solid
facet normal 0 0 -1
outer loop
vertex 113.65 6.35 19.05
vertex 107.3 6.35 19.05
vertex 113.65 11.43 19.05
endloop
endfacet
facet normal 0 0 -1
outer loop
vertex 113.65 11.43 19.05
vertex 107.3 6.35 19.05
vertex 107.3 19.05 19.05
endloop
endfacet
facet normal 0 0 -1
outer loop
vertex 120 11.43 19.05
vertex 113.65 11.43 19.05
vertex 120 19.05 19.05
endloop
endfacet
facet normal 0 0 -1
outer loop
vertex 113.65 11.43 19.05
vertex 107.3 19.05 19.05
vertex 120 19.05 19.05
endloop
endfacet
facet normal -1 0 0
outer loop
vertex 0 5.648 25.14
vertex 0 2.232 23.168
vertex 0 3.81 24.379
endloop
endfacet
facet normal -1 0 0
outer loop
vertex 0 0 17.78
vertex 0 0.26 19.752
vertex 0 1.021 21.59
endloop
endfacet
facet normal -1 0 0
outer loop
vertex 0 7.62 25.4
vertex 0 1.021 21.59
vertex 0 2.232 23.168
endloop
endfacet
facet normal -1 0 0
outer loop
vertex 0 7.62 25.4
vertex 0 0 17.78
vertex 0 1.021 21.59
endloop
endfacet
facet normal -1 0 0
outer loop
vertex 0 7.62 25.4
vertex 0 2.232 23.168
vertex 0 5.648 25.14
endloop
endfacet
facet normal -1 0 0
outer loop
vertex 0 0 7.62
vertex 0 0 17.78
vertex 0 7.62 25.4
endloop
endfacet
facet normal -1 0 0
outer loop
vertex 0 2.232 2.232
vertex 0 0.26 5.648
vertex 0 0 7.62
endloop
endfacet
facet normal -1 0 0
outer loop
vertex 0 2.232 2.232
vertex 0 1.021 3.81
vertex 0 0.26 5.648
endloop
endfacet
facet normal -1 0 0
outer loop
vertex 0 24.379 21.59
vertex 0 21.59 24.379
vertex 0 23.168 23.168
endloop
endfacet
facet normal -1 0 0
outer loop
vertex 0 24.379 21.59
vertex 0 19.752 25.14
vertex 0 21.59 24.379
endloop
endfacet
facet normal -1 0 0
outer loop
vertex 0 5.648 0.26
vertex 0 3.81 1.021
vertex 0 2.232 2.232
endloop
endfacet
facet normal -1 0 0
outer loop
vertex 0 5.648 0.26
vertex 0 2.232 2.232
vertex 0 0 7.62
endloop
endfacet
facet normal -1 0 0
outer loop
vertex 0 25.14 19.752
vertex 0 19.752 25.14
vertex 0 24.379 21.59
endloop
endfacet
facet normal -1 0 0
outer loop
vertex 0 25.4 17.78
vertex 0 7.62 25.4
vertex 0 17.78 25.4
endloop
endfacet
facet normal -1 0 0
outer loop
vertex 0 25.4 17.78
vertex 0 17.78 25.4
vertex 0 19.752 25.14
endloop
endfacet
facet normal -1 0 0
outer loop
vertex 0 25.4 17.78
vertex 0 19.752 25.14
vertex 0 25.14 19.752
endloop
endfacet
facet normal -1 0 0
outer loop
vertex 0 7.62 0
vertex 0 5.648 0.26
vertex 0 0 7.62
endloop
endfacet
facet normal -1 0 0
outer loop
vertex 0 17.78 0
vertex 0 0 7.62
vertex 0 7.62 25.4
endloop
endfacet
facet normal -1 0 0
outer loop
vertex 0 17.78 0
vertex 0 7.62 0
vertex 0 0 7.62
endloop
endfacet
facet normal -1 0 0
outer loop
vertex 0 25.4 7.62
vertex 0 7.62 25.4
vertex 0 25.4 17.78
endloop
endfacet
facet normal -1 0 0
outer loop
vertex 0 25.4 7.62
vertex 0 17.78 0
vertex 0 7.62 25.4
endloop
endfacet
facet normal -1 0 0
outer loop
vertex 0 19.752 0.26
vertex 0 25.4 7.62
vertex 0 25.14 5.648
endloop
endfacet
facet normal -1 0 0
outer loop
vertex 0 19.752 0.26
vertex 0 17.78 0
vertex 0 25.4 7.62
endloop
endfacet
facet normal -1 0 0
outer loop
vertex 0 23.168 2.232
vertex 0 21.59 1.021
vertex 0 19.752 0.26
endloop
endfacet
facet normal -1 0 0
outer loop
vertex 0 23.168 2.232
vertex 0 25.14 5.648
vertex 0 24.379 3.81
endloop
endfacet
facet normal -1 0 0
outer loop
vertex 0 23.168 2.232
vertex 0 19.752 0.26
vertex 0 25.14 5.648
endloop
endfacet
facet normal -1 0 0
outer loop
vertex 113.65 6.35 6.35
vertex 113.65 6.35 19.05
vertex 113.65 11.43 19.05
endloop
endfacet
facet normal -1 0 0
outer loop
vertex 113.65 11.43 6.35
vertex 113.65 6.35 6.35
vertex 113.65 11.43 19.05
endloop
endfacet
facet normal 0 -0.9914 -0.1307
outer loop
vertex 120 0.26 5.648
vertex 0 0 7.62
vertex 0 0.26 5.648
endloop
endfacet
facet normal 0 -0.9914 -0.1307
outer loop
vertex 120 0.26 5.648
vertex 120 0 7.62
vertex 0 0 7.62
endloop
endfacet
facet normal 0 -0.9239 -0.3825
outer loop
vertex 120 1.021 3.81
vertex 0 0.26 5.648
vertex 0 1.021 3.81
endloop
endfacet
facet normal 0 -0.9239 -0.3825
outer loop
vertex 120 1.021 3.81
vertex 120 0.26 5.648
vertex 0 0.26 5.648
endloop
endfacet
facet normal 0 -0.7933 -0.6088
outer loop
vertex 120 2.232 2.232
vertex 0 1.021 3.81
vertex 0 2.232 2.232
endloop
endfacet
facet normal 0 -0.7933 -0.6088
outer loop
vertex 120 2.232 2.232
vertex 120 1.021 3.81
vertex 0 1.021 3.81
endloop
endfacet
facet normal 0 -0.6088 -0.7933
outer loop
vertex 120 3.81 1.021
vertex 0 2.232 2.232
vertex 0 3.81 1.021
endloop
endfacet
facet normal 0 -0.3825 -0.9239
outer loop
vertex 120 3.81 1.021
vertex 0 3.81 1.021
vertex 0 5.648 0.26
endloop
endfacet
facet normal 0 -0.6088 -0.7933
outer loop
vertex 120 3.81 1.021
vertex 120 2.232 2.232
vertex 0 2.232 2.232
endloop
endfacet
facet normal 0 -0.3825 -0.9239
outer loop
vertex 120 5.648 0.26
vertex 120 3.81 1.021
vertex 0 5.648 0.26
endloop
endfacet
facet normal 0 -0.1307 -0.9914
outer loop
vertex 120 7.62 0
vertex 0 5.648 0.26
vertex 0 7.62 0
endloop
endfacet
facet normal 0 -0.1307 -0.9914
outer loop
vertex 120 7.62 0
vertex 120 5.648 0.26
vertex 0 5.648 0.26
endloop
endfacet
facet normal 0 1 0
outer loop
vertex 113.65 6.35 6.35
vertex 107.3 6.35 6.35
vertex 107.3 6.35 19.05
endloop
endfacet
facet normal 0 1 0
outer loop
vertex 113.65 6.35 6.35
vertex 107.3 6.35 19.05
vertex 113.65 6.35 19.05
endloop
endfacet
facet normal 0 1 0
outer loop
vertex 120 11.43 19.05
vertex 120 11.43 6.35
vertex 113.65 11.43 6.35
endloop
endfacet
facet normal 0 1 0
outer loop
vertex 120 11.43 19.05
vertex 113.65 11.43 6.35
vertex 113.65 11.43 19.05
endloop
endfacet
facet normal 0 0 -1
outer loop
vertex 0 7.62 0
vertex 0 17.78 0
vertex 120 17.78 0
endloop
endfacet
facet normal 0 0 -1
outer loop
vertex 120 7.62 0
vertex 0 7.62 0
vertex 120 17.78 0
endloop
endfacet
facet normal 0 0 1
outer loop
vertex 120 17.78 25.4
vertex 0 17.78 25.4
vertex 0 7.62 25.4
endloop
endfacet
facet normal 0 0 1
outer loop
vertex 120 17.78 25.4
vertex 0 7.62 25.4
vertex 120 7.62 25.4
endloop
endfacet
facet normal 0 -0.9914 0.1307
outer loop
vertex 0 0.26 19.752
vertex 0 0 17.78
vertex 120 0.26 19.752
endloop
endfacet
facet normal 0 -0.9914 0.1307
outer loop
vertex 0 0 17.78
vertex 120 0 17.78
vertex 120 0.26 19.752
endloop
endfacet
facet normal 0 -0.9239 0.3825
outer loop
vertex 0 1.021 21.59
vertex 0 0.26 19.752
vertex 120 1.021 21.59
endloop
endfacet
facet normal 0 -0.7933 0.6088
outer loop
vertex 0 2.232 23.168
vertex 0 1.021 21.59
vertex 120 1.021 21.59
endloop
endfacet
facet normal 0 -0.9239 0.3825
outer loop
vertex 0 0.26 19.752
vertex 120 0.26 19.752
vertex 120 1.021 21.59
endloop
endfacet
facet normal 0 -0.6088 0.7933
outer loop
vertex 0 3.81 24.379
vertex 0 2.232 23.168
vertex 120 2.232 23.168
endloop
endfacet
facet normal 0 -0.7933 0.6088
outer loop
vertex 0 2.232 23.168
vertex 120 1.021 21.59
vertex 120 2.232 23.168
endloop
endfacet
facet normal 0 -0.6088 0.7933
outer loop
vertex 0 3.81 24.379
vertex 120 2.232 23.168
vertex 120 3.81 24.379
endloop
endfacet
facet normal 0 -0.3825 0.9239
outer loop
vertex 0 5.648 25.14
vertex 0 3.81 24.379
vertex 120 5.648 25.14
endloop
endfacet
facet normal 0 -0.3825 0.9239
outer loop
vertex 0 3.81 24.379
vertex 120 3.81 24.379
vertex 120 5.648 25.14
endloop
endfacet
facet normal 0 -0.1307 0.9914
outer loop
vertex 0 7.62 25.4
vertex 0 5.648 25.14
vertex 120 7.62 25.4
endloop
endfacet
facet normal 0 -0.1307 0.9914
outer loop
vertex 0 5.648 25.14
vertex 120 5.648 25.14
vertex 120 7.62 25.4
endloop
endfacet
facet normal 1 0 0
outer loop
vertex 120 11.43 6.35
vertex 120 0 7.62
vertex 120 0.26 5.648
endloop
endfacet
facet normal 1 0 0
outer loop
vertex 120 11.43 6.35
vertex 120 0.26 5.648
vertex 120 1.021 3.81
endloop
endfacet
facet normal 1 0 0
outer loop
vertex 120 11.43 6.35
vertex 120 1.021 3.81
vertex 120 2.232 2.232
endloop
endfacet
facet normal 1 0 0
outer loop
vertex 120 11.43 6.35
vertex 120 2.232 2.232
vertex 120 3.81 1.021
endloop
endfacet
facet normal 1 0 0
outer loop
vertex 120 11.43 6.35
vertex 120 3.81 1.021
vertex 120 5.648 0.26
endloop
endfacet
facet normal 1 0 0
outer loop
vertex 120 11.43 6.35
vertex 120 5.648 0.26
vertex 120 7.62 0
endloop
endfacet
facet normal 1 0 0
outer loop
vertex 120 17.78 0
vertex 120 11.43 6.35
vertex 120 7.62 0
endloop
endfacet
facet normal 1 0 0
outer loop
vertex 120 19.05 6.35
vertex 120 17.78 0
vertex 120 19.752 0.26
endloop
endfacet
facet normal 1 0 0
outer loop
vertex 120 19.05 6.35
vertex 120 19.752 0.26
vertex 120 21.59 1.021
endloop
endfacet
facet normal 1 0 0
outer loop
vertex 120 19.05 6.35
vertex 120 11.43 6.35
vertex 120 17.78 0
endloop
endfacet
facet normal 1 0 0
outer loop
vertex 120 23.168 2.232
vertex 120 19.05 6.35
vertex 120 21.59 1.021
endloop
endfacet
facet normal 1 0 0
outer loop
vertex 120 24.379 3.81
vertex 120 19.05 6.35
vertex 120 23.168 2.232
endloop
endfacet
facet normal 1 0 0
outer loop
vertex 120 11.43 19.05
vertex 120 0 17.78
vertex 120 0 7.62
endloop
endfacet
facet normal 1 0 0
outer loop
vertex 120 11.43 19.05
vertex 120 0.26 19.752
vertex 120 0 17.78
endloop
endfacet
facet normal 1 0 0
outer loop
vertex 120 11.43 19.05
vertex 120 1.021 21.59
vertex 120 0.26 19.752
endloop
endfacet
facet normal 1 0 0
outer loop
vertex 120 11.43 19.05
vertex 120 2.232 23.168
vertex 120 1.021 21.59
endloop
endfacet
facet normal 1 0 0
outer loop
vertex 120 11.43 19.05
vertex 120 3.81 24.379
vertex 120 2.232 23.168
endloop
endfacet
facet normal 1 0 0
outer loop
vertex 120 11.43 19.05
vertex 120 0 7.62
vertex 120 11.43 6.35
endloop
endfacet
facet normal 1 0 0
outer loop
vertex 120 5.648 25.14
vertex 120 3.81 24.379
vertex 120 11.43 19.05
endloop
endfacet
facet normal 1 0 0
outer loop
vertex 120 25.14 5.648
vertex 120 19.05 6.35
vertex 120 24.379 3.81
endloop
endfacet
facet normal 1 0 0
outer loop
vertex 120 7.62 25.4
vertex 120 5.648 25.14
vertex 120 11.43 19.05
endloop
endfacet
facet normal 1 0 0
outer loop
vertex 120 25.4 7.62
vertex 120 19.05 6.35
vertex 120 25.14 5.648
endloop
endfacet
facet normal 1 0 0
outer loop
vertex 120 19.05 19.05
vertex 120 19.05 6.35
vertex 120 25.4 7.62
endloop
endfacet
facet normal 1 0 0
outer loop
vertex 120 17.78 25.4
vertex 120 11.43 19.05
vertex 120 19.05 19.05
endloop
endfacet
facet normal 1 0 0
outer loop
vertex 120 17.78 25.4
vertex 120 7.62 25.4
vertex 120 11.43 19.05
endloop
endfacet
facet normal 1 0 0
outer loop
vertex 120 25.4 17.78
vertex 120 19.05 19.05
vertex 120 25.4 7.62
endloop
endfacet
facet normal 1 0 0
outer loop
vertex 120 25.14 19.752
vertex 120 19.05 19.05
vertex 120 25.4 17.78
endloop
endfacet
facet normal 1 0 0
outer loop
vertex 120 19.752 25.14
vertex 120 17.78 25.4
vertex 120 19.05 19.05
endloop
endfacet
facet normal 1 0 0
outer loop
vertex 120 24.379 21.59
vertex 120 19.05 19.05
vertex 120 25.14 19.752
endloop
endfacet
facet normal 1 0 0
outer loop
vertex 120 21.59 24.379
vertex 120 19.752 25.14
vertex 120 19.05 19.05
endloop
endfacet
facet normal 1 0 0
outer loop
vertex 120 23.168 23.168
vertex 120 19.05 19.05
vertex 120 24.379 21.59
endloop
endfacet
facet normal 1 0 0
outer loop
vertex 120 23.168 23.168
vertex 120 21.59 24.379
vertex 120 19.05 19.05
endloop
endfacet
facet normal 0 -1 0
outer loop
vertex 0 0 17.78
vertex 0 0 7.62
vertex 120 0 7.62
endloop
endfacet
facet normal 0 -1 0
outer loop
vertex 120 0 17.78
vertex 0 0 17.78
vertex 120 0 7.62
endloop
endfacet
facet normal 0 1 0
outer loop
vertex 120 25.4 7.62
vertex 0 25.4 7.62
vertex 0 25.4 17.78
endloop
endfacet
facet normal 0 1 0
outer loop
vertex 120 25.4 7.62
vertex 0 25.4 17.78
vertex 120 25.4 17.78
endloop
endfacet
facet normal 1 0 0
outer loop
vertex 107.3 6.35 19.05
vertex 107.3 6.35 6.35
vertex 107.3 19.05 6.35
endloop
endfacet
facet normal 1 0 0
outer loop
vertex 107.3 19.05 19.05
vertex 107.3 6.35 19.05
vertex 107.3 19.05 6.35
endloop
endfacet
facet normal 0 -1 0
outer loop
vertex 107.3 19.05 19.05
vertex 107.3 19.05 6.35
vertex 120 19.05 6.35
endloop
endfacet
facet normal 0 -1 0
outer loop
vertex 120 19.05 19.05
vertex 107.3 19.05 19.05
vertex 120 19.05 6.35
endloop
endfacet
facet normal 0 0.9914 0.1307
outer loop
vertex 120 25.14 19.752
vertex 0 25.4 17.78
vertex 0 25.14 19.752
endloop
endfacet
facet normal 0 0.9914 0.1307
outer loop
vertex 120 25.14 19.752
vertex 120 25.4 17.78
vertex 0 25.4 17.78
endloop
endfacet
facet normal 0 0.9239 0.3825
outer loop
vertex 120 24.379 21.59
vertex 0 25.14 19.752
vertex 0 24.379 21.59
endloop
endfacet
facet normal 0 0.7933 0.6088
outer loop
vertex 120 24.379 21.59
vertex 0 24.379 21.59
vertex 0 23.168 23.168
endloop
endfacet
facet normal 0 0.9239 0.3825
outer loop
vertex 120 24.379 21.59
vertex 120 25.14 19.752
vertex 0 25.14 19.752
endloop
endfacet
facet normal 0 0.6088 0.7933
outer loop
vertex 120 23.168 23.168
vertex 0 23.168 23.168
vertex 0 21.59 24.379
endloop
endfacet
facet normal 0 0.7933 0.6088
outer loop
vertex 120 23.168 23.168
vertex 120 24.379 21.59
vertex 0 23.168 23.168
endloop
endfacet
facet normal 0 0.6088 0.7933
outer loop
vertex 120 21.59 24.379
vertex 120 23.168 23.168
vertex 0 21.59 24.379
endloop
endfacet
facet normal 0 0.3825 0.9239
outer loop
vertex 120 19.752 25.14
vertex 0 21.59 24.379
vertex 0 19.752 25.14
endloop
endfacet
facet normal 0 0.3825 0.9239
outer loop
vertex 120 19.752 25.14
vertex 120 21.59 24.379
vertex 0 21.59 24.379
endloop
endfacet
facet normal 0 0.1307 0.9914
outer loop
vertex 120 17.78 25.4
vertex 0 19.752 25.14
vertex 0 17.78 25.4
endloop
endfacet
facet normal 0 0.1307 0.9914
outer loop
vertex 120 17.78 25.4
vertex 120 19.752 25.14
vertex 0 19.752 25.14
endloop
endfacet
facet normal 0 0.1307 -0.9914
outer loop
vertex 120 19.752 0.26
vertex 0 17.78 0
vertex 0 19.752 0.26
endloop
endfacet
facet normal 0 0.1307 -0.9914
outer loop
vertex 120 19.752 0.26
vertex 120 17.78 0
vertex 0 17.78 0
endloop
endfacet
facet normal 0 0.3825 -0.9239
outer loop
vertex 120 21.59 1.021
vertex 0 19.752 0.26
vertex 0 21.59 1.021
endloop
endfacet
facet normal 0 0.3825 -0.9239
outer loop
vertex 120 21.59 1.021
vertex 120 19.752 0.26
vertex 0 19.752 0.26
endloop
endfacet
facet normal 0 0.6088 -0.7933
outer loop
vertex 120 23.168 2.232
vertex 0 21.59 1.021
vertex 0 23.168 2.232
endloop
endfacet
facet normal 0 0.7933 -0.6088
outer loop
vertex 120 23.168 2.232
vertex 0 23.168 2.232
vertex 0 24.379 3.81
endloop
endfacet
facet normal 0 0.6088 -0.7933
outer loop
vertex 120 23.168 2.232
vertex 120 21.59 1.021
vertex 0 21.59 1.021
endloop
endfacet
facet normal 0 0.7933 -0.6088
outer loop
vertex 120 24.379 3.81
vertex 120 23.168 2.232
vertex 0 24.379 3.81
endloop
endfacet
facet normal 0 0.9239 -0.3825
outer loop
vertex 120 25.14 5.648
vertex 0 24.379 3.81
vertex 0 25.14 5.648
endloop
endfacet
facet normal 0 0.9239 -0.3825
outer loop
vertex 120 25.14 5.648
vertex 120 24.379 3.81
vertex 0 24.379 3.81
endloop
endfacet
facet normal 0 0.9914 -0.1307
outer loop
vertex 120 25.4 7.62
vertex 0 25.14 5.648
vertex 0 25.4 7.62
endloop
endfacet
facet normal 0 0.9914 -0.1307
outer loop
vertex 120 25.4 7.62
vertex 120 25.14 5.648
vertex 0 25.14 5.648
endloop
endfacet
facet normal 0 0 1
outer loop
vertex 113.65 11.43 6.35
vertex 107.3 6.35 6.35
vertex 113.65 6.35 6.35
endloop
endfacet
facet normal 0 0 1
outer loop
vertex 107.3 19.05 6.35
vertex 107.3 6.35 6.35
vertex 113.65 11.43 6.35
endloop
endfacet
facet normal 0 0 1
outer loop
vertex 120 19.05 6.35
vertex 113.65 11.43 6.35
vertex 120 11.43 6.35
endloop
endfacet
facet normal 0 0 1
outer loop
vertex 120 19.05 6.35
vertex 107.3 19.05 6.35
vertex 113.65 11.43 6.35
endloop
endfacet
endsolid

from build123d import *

# Parameters (mm, degrees)
F0_W     = 120
F0_H     = 25.4
F1_DEPTH = 25.4
F2_T     = -6.35
F3_W     = 5.079999955
F3_H     = 12.7
F4_DEPTH = 6.35
F5_DEPTH = 100.94976
F6_R     = 7.62


with BuildPart() as f1:
    # F0 (on Top) → F1 (new body)
    with BuildSketch(Plane.XY):
        with Locations((60, 12.7)):
            Rectangle(F0_W, F0_H)
    extrude(amount=F1_DEPTH)

    # F2
    f2_openings = [f1.faces().sort_by_distance(p)[0] for p in [
        (120, 12.7, 12.7),
    ]]
    offset(amount=F2_T, openings=f2_openings)

    # F3 (on face) → F4 (join)
    with BuildSketch(Plane.YZ.offset(120)):
        with Locations((8.8899999775, 12.7)):
            Rectangle(F3_W, F3_H)
    extrude(amount=-F4_DEPTH)

    # F5 (add): a face of the model
    f5_faces = [f1.faces().sort_by_distance(p)[0] for p in [
        (6.35, 12.7, 12.7),
    ]]
    extrude(f5_faces, amount=F5_DEPTH)

    # F6
    f6_edges = [f1.edges().sort_by_distance(p)[0] for p in [
        (60, 25.4, 25.4),
        (60, 0, 25.4),
        (60, 0, 0),
        (60, 25.4, 0),
    ]]
    fillet(f6_edges, radius=F6_R)


solid = f1.part
